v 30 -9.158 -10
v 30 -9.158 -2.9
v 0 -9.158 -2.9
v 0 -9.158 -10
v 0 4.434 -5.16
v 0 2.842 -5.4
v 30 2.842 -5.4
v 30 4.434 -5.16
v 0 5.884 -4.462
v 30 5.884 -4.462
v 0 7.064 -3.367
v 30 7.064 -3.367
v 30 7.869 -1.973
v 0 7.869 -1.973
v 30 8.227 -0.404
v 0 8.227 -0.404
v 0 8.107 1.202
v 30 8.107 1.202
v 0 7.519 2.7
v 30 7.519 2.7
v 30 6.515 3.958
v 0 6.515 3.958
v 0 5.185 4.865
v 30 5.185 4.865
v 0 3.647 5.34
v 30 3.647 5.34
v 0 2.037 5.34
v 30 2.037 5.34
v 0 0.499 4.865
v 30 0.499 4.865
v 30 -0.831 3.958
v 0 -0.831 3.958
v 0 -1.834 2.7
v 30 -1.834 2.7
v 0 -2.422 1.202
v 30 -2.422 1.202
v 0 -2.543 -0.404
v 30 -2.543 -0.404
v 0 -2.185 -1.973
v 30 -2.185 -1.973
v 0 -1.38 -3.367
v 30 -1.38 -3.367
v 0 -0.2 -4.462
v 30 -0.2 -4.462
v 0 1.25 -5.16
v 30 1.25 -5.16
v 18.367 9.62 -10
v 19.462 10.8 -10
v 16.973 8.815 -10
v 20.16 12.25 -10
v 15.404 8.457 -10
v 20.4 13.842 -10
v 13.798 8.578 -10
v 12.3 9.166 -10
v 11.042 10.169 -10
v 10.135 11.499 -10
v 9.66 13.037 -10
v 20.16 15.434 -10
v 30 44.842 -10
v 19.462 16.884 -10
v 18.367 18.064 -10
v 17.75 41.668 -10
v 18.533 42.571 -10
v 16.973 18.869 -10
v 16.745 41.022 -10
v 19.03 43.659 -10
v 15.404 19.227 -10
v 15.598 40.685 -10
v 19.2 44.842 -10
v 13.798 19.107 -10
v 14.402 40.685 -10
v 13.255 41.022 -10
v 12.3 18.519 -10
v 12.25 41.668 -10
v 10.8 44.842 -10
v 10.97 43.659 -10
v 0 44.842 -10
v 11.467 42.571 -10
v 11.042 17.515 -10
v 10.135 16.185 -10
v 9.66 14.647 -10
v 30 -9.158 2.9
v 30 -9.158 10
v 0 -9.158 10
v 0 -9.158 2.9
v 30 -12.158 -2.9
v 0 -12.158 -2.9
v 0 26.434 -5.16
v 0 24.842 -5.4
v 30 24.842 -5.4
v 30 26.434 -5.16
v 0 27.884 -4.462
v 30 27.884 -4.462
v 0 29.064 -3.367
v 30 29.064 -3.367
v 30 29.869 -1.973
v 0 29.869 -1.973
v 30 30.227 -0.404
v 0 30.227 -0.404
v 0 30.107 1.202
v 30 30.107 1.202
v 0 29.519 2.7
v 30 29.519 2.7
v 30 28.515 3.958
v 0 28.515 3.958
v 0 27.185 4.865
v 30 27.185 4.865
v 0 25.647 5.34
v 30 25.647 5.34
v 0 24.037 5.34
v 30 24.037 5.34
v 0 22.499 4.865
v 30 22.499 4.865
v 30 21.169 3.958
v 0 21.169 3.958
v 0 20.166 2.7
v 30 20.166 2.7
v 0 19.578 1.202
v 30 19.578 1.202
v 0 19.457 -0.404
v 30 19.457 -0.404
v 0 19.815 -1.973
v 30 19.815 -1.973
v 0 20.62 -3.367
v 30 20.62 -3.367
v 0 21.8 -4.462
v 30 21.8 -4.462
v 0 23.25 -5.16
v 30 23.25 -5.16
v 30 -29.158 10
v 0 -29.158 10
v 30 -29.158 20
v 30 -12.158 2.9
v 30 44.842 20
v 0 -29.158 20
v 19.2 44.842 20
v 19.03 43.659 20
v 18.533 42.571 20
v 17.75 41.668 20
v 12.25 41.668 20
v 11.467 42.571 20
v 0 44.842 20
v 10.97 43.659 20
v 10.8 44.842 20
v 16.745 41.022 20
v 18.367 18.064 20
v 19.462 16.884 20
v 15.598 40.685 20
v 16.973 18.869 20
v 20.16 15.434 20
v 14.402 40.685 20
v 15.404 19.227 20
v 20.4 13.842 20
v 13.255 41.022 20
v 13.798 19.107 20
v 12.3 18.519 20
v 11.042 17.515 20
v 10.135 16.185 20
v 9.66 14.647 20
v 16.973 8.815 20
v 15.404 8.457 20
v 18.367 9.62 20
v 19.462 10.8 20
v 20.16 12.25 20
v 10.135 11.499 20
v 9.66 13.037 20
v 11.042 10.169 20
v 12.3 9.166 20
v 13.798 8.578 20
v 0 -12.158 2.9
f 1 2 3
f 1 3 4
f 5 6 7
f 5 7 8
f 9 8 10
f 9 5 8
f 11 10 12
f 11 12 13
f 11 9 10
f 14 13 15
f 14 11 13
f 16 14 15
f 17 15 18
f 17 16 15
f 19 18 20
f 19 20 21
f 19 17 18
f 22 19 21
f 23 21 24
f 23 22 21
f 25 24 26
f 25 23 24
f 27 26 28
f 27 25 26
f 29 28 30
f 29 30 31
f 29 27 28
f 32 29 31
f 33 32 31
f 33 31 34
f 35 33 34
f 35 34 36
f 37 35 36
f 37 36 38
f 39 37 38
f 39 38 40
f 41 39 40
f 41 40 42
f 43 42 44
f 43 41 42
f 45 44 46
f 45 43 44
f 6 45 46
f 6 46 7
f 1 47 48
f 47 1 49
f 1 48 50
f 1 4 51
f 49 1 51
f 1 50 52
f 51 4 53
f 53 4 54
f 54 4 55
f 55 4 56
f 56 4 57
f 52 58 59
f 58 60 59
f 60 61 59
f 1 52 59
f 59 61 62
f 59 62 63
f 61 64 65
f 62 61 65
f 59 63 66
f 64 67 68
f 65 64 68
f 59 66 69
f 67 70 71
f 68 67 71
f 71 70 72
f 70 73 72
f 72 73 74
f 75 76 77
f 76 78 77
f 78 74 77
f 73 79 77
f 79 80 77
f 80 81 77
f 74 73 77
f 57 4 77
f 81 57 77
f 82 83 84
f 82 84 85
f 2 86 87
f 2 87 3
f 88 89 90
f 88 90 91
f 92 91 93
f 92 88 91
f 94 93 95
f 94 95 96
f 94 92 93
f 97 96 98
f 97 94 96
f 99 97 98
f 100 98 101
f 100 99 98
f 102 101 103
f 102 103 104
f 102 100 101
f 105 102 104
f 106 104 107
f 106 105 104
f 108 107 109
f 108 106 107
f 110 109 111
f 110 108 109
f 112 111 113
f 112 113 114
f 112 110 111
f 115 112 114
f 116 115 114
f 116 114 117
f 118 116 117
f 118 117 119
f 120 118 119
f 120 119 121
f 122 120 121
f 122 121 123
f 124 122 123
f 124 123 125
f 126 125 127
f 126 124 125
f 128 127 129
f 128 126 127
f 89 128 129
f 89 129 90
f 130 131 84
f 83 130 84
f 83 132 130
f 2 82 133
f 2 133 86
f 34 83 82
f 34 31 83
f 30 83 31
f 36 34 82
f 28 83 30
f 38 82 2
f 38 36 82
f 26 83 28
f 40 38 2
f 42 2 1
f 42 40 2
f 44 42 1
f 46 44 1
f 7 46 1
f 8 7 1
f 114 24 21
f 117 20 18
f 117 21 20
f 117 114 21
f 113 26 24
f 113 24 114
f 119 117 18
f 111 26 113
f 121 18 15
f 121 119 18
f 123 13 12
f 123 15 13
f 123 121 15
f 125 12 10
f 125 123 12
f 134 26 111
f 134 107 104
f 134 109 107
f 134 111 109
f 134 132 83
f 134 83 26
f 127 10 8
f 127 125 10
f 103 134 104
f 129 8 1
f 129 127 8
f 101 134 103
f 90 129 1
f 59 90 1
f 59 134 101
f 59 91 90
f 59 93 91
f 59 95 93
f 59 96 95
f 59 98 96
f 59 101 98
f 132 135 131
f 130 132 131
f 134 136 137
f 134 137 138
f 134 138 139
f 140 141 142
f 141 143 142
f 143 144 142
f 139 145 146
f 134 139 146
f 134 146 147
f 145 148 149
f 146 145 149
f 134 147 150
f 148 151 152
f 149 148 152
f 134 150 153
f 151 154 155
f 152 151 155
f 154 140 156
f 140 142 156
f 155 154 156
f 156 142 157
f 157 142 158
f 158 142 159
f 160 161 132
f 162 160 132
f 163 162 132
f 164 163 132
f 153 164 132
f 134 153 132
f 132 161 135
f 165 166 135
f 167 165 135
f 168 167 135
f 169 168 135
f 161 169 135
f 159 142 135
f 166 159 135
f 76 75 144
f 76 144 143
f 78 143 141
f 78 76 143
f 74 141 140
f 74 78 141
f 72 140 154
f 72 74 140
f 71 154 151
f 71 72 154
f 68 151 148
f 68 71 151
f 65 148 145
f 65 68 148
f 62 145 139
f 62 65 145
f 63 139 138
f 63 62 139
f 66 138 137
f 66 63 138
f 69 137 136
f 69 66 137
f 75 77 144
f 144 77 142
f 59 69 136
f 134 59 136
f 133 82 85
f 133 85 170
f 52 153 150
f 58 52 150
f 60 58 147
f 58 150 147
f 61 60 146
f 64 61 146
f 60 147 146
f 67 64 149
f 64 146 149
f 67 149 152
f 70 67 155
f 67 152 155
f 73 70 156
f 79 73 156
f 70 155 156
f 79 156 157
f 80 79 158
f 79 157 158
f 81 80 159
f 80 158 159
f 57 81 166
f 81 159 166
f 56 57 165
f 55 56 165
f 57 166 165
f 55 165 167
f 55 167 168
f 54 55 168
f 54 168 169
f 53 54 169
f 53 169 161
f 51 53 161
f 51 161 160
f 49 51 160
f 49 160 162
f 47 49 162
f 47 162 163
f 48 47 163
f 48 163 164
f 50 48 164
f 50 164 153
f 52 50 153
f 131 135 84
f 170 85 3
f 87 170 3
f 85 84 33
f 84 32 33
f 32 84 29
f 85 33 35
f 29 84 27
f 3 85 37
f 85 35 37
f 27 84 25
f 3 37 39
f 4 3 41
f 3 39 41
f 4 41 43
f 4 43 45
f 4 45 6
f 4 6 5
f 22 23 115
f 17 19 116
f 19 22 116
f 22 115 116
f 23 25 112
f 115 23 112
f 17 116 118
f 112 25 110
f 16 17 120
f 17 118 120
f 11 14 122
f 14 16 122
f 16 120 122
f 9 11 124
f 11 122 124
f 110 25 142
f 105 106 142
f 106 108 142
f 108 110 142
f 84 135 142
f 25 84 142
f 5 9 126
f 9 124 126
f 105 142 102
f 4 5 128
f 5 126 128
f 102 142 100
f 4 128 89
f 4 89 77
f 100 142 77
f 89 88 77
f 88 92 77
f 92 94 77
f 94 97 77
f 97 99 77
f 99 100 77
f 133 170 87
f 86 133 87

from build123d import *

# Parameters (mm, degrees)
SKETCH24_R          = 5.4
BOSS_EXTRUDE1_DEPTH = 30
SKETCH26_R          = 4.2
RODS_SLOT_DEPTH     = 62.731822261
SKETCH25_R          = 5.4
RODS_HOLE_DEPTH     = 50


with BuildPart() as part:
    # Sketch24 → Boss-Extrude1 (new body)
    with BuildSketch(Plane(origin=(0, 0, 0), x_dir=(0, 0, -1), z_dir=(1, 0, 0))):
        Polygon((10, -9.157855987), (10, 44.842144013), (-20, 44.842144013), (-20, -29.157855987), (-10, -29.157855987), (-10, -9.157855987), (-2.9, -9.157855987), (-2.9, -12.157855987), (2.9, -12.157855987), (2.9, -9.157855987), align=None)
        with Locations((0, 24.842144013)):
            Circle(SKETCH24_R, mode=Mode.SUBTRACT)
        with Locations((0, 2.842144013)):
            Circle(SKETCH24_R, mode=Mode.SUBTRACT)
    extrude(amount=BOSS_EXTRUDE1_DEPTH)

    # Sketch26 → rods_slot (cut, through all)
    with BuildSketch(Plane.XY.offset(-10)):
        with Locations((15, 44.842144013)):
            Circle(SKETCH26_R)
    extrude(amount=RODS_SLOT_DEPTH, mode=Mode.SUBTRACT)

    # Sketch25 → rods-hole (cut)
    with BuildSketch(Plane.XY.offset(20)):
        with Locations((15, 13.842144013)):
            Circle(SKETCH25_R)
    extrude(amount=-RODS_HOLE_DEPTH, mode=Mode.SUBTRACT)


solid = part.part
